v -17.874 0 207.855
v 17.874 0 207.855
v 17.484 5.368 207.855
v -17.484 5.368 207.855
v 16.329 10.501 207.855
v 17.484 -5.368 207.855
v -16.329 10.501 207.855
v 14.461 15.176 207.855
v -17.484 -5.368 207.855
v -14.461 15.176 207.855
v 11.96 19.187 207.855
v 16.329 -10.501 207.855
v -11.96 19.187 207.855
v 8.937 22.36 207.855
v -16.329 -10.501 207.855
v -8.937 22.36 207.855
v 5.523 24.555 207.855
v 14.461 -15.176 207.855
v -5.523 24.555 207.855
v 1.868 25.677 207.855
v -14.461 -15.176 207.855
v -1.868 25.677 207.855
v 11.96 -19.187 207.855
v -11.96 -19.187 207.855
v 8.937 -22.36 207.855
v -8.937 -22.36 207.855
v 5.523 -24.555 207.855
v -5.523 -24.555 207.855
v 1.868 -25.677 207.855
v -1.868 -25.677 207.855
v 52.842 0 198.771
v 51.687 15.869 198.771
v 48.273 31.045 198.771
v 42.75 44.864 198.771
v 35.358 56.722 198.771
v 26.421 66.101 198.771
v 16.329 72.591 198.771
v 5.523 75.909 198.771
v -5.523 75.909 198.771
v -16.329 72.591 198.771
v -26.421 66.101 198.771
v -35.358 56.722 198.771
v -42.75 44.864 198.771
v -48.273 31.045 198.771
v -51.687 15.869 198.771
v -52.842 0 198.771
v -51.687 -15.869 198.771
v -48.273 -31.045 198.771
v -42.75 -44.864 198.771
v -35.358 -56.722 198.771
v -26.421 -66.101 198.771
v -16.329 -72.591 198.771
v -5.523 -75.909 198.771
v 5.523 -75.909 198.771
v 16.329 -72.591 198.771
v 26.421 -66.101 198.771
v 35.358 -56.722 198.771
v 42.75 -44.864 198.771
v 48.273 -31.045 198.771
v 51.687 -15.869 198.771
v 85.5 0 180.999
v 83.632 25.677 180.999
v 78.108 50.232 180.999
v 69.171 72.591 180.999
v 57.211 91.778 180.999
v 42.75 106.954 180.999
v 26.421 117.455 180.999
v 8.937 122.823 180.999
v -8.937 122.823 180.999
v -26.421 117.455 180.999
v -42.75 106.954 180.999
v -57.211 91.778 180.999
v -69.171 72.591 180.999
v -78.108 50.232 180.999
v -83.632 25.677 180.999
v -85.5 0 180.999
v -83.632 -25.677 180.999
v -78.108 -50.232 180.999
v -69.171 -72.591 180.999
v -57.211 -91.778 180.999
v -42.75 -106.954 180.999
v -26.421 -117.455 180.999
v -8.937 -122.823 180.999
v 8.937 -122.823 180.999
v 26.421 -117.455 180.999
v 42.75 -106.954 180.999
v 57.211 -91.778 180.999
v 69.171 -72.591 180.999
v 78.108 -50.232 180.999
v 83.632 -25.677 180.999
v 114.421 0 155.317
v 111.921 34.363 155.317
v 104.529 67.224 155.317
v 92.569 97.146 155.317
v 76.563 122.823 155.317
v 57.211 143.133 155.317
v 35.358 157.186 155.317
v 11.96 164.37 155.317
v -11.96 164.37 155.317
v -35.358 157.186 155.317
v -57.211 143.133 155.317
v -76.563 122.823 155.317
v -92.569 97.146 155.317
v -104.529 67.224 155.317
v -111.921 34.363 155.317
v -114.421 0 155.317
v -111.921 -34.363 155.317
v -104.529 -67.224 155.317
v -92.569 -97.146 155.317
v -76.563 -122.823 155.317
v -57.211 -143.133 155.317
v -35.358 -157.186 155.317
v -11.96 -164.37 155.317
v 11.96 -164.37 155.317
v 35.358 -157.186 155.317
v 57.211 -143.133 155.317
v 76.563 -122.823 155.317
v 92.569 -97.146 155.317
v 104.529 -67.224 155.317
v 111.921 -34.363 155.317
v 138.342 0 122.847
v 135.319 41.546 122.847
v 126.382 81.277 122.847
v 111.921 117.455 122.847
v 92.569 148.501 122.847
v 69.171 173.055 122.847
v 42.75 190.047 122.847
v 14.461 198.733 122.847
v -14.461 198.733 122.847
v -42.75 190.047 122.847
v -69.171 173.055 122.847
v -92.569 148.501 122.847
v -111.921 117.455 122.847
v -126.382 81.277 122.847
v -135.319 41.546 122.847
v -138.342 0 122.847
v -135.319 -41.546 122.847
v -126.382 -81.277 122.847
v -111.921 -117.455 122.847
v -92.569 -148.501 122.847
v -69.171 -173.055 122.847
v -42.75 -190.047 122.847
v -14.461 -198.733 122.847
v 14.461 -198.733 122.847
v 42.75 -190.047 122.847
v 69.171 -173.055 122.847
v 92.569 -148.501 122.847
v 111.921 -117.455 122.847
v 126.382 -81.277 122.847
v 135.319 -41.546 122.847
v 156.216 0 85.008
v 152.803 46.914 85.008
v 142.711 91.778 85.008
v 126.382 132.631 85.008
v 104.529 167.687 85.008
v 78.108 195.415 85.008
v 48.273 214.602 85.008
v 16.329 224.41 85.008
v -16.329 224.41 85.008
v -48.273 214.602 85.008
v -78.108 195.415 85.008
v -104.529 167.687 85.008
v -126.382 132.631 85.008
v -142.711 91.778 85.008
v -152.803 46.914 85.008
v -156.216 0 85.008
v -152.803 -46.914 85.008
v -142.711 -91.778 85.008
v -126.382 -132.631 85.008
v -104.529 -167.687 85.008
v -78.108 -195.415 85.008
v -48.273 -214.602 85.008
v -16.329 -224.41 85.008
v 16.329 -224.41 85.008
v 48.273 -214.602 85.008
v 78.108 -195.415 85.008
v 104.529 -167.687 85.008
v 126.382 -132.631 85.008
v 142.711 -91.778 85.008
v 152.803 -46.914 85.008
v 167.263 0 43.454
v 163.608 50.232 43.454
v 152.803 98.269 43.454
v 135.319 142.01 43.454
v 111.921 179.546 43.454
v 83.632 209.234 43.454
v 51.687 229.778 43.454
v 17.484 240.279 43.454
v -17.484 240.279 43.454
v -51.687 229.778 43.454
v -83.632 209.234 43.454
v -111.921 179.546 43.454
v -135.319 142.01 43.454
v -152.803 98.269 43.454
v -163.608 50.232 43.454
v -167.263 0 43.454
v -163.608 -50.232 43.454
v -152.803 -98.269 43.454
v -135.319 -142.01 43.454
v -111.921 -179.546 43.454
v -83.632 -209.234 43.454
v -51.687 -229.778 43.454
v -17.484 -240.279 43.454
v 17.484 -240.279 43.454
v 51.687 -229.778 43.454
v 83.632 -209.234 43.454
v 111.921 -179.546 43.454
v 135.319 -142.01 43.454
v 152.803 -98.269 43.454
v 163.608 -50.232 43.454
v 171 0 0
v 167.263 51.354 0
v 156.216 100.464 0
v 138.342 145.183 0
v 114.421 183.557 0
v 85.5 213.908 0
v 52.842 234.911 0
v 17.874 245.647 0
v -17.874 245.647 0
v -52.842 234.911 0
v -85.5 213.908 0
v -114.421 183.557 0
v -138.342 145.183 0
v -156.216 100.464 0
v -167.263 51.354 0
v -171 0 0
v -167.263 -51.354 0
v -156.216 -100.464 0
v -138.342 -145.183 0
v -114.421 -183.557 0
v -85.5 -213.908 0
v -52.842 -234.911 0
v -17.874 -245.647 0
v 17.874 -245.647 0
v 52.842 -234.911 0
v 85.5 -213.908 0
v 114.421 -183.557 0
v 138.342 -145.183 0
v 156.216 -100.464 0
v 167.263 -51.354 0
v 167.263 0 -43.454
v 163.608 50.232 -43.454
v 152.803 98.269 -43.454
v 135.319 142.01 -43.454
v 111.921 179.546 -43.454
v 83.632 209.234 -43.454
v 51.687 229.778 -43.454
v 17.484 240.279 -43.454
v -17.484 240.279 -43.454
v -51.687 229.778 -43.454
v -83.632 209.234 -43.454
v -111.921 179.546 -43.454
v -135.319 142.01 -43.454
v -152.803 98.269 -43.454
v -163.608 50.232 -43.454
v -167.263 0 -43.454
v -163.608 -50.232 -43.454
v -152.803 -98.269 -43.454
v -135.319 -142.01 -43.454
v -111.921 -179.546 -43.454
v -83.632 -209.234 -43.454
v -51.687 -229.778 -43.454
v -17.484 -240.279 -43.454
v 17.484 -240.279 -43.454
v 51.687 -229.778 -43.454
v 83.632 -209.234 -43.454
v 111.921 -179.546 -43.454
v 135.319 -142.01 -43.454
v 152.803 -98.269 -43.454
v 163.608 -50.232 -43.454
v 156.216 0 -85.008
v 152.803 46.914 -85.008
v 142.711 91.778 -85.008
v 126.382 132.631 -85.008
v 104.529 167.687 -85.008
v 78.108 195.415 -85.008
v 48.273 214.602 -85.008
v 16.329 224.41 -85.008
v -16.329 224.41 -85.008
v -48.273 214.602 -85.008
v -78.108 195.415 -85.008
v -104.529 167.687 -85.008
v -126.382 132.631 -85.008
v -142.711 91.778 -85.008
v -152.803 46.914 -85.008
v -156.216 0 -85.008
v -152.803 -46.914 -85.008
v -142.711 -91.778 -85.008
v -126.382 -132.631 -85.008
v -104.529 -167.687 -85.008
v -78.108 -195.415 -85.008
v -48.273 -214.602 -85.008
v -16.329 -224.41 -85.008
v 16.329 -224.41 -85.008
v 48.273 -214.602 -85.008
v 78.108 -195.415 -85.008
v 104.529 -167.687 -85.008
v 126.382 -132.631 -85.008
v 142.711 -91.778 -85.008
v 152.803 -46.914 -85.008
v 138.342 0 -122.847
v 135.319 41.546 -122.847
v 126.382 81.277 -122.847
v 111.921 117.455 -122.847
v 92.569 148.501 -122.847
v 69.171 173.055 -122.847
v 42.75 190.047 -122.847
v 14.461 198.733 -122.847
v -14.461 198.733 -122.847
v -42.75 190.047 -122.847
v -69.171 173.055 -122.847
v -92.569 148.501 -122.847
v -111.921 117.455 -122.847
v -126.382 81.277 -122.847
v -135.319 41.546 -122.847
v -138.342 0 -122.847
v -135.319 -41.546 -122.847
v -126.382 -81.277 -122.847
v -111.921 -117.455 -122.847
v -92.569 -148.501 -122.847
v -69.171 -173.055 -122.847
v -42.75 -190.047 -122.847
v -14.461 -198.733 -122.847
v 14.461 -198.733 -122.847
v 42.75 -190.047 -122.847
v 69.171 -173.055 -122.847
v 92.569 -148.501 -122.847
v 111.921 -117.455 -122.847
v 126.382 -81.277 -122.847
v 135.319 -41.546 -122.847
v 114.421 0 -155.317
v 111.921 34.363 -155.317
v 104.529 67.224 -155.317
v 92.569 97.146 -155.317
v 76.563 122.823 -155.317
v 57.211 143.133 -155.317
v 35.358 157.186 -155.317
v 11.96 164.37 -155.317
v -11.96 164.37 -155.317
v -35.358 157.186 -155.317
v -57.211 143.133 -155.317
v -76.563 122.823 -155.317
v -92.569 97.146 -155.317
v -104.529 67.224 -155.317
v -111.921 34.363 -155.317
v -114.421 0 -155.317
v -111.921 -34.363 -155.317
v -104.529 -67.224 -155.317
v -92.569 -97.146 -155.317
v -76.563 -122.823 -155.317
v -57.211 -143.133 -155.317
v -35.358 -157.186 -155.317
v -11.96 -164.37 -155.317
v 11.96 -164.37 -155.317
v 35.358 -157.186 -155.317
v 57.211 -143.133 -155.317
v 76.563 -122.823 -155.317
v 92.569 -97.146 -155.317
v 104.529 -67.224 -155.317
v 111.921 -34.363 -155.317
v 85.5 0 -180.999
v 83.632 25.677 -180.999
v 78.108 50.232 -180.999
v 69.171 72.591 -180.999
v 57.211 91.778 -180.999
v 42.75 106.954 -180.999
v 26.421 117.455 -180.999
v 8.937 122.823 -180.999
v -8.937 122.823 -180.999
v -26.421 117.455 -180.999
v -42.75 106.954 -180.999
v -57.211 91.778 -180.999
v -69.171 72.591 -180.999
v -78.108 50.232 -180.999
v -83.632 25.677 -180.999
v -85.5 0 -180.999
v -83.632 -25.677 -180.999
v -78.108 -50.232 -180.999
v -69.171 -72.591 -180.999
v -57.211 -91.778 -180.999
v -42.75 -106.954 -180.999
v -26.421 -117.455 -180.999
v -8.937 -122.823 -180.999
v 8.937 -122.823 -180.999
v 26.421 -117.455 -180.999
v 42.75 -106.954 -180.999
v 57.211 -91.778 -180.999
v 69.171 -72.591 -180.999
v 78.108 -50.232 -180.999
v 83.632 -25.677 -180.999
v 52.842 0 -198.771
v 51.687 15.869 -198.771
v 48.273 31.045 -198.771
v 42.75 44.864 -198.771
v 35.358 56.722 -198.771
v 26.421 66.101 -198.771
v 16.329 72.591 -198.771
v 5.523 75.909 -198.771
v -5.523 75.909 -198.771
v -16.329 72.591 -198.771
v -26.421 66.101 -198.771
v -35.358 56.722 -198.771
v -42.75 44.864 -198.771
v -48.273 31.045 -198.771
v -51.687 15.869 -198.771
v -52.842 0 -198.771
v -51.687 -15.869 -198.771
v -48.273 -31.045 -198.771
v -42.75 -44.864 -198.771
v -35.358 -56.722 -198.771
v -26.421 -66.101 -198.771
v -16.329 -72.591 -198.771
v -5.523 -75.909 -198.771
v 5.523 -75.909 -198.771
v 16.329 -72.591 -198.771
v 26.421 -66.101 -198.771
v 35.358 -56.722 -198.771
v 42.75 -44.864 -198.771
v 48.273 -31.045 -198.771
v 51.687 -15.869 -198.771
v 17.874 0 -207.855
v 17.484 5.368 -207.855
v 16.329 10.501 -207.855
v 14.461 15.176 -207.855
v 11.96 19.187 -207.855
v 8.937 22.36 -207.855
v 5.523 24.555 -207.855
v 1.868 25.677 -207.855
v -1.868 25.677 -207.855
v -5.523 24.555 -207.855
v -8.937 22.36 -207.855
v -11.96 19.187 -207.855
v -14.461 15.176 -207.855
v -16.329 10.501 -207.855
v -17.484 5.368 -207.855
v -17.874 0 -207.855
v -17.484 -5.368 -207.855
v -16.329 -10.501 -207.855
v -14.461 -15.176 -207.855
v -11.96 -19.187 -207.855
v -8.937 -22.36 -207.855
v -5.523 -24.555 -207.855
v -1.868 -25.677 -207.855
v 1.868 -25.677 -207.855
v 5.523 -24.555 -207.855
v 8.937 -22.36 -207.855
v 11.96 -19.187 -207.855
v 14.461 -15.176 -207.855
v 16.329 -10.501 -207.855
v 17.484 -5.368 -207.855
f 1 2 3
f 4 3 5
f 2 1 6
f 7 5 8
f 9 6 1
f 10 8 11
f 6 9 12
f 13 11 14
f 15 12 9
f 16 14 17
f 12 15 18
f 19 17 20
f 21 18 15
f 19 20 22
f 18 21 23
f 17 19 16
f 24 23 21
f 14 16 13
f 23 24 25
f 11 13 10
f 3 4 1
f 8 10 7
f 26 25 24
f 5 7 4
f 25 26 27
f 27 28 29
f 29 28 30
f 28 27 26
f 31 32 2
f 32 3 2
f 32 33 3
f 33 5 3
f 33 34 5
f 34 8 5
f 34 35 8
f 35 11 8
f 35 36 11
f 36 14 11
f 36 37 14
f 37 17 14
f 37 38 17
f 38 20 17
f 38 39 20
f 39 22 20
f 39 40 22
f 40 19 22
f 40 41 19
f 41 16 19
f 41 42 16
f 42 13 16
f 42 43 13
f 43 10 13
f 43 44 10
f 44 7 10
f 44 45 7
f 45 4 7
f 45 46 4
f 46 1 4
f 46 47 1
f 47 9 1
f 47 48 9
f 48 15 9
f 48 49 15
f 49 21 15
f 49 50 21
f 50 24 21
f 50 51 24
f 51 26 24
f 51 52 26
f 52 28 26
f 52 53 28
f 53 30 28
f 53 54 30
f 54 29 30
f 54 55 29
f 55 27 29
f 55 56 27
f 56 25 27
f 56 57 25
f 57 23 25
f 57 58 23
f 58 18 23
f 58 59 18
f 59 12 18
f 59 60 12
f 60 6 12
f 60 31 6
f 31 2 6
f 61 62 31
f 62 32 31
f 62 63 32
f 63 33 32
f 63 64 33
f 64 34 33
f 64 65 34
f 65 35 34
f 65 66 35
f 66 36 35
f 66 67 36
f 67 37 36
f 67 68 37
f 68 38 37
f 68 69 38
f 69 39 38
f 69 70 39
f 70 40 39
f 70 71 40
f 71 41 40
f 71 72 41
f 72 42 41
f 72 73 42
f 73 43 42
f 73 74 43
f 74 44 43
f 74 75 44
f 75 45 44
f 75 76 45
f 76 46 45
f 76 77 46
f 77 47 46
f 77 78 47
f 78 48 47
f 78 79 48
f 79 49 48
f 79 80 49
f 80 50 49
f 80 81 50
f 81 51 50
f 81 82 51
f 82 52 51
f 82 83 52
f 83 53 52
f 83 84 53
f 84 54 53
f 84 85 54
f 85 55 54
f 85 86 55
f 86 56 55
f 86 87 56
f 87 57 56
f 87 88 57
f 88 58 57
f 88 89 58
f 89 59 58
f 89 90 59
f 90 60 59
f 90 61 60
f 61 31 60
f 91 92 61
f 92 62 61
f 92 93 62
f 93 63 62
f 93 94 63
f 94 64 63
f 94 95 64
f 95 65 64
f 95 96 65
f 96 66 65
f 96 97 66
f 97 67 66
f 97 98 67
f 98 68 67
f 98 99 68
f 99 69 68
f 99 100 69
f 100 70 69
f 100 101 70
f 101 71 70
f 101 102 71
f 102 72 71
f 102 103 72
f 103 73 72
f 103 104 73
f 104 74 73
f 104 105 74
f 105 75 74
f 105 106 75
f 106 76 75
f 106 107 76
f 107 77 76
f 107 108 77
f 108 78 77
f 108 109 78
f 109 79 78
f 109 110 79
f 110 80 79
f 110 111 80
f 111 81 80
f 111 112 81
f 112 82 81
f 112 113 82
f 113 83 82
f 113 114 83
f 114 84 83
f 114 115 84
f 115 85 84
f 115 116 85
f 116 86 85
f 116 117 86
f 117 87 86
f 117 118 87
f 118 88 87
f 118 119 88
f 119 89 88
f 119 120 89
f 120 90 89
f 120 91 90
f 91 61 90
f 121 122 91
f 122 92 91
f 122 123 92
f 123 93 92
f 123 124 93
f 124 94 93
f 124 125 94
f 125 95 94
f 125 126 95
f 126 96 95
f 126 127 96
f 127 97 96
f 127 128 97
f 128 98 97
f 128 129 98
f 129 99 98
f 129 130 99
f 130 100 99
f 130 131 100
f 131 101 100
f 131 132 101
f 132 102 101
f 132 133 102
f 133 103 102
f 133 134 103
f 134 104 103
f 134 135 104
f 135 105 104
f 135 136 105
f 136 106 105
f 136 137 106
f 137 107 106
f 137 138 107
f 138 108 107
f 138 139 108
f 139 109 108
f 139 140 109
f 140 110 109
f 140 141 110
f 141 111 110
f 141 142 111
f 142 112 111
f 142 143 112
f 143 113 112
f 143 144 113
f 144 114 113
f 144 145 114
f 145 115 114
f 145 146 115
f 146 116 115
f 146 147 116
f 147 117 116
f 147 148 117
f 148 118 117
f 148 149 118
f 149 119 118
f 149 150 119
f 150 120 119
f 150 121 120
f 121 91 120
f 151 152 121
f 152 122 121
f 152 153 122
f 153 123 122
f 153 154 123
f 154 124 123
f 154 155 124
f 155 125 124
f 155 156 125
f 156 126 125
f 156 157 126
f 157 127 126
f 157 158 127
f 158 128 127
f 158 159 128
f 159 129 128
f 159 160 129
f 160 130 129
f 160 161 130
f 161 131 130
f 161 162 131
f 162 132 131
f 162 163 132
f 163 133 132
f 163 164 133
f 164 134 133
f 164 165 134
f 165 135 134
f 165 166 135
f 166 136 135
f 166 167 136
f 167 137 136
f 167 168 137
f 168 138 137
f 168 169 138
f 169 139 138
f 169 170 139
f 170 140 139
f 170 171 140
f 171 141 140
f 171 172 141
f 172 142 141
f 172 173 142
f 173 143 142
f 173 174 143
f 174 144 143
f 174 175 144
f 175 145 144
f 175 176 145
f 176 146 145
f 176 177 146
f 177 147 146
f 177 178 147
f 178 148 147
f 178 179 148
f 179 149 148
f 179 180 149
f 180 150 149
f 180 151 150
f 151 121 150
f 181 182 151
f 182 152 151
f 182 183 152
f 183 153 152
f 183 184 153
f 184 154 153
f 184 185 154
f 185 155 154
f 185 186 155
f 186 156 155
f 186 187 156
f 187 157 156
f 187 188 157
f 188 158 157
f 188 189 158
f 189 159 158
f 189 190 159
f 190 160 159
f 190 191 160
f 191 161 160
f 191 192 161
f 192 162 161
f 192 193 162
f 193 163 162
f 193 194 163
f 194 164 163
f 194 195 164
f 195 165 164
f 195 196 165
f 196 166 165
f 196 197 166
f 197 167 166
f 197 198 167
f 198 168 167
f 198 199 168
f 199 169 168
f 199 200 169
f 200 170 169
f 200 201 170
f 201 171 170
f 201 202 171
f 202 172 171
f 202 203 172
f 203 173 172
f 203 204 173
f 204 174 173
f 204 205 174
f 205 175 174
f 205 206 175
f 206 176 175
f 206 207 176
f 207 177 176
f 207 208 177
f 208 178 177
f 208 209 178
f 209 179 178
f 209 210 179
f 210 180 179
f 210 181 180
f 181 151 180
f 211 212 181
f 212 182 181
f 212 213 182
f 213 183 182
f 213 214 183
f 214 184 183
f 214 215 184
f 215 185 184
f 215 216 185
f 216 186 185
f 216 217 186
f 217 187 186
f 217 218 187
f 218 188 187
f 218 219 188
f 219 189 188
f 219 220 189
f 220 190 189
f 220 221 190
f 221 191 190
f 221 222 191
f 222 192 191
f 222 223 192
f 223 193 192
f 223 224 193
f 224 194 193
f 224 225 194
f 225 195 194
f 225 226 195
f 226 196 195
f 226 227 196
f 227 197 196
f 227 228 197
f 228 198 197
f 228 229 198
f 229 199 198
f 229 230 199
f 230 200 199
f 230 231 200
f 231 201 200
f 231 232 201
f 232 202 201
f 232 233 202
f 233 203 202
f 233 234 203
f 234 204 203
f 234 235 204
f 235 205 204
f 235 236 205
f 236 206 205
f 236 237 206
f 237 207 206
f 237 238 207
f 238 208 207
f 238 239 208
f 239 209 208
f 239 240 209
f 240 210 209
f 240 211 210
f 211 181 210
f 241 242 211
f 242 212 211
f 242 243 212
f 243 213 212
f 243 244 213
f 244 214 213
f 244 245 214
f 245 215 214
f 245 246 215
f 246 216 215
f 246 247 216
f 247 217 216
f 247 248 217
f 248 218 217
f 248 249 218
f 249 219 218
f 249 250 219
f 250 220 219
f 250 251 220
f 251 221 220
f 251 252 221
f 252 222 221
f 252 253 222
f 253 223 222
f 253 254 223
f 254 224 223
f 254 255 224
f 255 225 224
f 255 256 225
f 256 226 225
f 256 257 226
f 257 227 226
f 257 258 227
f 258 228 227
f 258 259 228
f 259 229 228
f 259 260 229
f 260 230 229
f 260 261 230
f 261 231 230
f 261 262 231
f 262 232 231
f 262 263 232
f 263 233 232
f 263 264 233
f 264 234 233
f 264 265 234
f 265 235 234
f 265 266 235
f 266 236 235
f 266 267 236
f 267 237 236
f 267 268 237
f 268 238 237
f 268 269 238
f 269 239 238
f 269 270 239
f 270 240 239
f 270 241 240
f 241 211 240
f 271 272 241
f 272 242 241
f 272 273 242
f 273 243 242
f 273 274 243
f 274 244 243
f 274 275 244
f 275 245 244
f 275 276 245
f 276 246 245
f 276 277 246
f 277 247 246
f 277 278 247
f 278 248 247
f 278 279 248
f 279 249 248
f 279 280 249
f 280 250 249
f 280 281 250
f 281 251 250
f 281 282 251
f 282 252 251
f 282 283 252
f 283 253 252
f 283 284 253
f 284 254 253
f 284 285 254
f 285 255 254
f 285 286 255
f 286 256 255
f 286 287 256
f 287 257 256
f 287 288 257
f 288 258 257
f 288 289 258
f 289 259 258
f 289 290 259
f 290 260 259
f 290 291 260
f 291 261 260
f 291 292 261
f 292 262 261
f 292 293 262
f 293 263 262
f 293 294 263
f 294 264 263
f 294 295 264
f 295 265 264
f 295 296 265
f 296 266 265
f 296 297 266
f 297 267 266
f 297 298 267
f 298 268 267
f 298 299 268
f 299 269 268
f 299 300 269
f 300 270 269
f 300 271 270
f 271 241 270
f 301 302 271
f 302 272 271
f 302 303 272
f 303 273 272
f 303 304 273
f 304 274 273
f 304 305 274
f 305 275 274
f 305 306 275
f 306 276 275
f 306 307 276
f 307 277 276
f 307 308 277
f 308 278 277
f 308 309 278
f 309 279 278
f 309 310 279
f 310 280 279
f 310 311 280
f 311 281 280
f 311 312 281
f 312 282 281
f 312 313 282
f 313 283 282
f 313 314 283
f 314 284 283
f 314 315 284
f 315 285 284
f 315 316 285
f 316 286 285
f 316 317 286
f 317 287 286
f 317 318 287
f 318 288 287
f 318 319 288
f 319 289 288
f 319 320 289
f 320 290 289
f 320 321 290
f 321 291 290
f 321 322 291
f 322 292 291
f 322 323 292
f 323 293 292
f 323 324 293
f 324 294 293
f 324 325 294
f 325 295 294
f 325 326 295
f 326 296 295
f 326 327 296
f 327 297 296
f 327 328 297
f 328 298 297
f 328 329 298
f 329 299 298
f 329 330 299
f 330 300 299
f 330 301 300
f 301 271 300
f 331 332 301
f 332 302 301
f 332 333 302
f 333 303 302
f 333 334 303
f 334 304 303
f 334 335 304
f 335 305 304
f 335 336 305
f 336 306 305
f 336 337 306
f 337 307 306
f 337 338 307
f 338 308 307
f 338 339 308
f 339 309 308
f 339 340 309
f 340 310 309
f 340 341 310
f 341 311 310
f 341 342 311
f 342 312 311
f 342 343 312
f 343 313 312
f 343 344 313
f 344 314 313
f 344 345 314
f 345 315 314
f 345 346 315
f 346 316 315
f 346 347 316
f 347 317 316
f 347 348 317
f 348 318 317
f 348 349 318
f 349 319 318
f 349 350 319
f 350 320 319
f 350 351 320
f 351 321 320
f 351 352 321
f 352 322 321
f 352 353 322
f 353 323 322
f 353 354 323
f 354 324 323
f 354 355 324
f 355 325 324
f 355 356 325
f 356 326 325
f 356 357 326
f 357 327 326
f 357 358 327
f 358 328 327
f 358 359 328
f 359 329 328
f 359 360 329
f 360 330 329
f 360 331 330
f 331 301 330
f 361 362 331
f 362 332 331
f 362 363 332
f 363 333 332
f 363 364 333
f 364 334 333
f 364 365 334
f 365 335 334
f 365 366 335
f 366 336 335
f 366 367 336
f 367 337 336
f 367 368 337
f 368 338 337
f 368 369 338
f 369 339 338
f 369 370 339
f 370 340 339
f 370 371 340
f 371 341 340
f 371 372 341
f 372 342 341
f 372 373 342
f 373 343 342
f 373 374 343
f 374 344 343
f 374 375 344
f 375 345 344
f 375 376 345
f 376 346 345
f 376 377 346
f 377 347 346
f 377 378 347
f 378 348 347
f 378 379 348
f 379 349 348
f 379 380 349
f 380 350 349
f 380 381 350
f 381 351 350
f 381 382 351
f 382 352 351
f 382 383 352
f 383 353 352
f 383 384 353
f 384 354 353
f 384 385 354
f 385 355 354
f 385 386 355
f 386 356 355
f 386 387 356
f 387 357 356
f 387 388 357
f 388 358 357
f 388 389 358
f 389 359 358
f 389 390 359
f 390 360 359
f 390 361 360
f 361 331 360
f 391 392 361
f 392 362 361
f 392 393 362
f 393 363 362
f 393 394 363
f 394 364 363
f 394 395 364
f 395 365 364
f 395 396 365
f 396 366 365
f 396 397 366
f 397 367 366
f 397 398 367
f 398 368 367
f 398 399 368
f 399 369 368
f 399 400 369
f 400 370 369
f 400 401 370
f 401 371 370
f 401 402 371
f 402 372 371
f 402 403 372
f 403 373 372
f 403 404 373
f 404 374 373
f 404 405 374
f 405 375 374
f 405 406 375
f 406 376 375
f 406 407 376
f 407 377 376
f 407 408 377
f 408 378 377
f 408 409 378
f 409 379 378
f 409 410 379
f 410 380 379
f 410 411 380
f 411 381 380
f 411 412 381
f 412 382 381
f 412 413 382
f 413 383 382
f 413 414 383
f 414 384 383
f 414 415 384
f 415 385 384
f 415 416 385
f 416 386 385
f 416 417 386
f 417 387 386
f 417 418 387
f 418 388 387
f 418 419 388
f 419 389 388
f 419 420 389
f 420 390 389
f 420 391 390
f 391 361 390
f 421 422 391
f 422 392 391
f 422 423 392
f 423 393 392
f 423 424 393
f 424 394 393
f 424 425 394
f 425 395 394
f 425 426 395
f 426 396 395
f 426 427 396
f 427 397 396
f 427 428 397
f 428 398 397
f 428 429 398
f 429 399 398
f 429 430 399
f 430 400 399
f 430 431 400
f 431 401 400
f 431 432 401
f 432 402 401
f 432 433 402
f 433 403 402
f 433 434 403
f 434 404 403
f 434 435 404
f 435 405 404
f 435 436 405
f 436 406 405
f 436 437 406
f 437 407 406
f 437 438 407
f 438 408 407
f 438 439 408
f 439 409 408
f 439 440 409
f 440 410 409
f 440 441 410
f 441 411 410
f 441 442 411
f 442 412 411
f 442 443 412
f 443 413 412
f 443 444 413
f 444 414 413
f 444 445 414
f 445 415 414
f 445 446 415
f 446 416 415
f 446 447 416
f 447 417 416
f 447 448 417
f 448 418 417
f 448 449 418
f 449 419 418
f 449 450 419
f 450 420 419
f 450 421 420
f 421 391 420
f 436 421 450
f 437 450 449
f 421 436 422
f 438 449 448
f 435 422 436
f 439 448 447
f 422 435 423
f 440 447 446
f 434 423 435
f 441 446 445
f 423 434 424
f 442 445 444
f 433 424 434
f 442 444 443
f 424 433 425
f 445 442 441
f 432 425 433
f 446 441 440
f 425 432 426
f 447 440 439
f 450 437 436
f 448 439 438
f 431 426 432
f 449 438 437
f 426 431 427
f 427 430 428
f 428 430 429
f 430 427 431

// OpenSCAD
// Generated by SolidPython 1.0.1 on 2020-07-29 00:46:48


scale(v = [9, 13, 11]) {
	sphere(r = 19);
}
/***********************************************
*********      SolidPython code:      **********
************************************************
 
# import packages: SolidPython
from solid import *
from solid.utils import *
from itertools import chain, combinations, permutations


class Resize:

    def __init__(self, scad_file):
        self.scad_file = scad_file
        #self.scad_file = import_scad(scad_file)
        # cone/cylinder param:
        self.r1 = 0
        self.r2 = 0
        self.h = 0
        # rectangular prism param:
        self.w = 0
        self.l = 0
        # ellipse param:
        self.r = 0

    # import OpenScad code (file name corresponds to shape)


    # classify shape + parameters
    def assign(self, param1, param2, param3):
        if self.scad_file == 'cone.scad':
            self.r1 = param1
            self.r2 = param2
            self.h = param3
        elif self.scad_file == 'cylinder.scad':
            self.r1 = param1
            self.r2 = param2
            self.h = param3
        elif self.scad_file == 'rectangularPrism.scad':
            self.h = param1
            self.l = param2
            self.w = param3
        else:
            self.r = param1
            self.h = param2

    # resize parameters
    def iterate(self):
        x = range(3, 20, 2)
        i = 1
        if self.scad_file == 'cone.scad':
            tempList = list(permutations(x, 2))
            for temp in tempList:
                param1 = temp[0]
                param2 = temp[1]
                filepath = 'produced_scad_files/' + 'cone' + str(param1) + '_' + str(param2) + '_' + '.scad'
                scad_render_to_file(cylinder(h=param1, r1=param2, r2=0), filepath)

        elif self.scad_file == 'cylinder.scad':
            tempList = list(permutations(x, 3))
            for temp in tempList:
                param1 = temp[0]
                param2 = temp[1]
                filepath = 'produced_scad_files/' + 'cylinder' + str(param1) + '_' + str(param2) + '_' + '.scad'
                scad_render_to_file(cylinder(h=param1, r1=param2, r2=param2), filepath)

        elif self.scad_file == 'rectangularPrism.scad':
            tempList = list(permutations(x, 3))
            for temp in tempList:
                param1 = temp[0]
                param2 = temp[1]
                param3 = temp[2]
                filepath = 'produced_scad_files/' + 'rectangularPrism' + str(param1) + '_' + str(param2) + '_' + str(
                    param3) + '.scad'
                scad_render_to_file(cube(size=(param1, param2, param3)), filepath)

        elif self.scad_file == 'ellipse.scad':
            tempList = list(permutations(x, 4))
            for temp in tempList:
                param1 = temp[0]
                param2 = temp[1]
                param3 = temp[2]
                param4 = temp[3]
                filepath = 'produced_scad_files/' + 'ellipse' + str(param1) + '_' + str(param2) + '_' + str(param3) + '_' + str(param4) + '.scad'
                scad_render_to_file(scale([param1, param2, param3])(sphere(r=param4)), filepath)

    def render_to_scadfile(self):
        scad_render_to_file(scad, 'example.scad') 
 
************************************************/
